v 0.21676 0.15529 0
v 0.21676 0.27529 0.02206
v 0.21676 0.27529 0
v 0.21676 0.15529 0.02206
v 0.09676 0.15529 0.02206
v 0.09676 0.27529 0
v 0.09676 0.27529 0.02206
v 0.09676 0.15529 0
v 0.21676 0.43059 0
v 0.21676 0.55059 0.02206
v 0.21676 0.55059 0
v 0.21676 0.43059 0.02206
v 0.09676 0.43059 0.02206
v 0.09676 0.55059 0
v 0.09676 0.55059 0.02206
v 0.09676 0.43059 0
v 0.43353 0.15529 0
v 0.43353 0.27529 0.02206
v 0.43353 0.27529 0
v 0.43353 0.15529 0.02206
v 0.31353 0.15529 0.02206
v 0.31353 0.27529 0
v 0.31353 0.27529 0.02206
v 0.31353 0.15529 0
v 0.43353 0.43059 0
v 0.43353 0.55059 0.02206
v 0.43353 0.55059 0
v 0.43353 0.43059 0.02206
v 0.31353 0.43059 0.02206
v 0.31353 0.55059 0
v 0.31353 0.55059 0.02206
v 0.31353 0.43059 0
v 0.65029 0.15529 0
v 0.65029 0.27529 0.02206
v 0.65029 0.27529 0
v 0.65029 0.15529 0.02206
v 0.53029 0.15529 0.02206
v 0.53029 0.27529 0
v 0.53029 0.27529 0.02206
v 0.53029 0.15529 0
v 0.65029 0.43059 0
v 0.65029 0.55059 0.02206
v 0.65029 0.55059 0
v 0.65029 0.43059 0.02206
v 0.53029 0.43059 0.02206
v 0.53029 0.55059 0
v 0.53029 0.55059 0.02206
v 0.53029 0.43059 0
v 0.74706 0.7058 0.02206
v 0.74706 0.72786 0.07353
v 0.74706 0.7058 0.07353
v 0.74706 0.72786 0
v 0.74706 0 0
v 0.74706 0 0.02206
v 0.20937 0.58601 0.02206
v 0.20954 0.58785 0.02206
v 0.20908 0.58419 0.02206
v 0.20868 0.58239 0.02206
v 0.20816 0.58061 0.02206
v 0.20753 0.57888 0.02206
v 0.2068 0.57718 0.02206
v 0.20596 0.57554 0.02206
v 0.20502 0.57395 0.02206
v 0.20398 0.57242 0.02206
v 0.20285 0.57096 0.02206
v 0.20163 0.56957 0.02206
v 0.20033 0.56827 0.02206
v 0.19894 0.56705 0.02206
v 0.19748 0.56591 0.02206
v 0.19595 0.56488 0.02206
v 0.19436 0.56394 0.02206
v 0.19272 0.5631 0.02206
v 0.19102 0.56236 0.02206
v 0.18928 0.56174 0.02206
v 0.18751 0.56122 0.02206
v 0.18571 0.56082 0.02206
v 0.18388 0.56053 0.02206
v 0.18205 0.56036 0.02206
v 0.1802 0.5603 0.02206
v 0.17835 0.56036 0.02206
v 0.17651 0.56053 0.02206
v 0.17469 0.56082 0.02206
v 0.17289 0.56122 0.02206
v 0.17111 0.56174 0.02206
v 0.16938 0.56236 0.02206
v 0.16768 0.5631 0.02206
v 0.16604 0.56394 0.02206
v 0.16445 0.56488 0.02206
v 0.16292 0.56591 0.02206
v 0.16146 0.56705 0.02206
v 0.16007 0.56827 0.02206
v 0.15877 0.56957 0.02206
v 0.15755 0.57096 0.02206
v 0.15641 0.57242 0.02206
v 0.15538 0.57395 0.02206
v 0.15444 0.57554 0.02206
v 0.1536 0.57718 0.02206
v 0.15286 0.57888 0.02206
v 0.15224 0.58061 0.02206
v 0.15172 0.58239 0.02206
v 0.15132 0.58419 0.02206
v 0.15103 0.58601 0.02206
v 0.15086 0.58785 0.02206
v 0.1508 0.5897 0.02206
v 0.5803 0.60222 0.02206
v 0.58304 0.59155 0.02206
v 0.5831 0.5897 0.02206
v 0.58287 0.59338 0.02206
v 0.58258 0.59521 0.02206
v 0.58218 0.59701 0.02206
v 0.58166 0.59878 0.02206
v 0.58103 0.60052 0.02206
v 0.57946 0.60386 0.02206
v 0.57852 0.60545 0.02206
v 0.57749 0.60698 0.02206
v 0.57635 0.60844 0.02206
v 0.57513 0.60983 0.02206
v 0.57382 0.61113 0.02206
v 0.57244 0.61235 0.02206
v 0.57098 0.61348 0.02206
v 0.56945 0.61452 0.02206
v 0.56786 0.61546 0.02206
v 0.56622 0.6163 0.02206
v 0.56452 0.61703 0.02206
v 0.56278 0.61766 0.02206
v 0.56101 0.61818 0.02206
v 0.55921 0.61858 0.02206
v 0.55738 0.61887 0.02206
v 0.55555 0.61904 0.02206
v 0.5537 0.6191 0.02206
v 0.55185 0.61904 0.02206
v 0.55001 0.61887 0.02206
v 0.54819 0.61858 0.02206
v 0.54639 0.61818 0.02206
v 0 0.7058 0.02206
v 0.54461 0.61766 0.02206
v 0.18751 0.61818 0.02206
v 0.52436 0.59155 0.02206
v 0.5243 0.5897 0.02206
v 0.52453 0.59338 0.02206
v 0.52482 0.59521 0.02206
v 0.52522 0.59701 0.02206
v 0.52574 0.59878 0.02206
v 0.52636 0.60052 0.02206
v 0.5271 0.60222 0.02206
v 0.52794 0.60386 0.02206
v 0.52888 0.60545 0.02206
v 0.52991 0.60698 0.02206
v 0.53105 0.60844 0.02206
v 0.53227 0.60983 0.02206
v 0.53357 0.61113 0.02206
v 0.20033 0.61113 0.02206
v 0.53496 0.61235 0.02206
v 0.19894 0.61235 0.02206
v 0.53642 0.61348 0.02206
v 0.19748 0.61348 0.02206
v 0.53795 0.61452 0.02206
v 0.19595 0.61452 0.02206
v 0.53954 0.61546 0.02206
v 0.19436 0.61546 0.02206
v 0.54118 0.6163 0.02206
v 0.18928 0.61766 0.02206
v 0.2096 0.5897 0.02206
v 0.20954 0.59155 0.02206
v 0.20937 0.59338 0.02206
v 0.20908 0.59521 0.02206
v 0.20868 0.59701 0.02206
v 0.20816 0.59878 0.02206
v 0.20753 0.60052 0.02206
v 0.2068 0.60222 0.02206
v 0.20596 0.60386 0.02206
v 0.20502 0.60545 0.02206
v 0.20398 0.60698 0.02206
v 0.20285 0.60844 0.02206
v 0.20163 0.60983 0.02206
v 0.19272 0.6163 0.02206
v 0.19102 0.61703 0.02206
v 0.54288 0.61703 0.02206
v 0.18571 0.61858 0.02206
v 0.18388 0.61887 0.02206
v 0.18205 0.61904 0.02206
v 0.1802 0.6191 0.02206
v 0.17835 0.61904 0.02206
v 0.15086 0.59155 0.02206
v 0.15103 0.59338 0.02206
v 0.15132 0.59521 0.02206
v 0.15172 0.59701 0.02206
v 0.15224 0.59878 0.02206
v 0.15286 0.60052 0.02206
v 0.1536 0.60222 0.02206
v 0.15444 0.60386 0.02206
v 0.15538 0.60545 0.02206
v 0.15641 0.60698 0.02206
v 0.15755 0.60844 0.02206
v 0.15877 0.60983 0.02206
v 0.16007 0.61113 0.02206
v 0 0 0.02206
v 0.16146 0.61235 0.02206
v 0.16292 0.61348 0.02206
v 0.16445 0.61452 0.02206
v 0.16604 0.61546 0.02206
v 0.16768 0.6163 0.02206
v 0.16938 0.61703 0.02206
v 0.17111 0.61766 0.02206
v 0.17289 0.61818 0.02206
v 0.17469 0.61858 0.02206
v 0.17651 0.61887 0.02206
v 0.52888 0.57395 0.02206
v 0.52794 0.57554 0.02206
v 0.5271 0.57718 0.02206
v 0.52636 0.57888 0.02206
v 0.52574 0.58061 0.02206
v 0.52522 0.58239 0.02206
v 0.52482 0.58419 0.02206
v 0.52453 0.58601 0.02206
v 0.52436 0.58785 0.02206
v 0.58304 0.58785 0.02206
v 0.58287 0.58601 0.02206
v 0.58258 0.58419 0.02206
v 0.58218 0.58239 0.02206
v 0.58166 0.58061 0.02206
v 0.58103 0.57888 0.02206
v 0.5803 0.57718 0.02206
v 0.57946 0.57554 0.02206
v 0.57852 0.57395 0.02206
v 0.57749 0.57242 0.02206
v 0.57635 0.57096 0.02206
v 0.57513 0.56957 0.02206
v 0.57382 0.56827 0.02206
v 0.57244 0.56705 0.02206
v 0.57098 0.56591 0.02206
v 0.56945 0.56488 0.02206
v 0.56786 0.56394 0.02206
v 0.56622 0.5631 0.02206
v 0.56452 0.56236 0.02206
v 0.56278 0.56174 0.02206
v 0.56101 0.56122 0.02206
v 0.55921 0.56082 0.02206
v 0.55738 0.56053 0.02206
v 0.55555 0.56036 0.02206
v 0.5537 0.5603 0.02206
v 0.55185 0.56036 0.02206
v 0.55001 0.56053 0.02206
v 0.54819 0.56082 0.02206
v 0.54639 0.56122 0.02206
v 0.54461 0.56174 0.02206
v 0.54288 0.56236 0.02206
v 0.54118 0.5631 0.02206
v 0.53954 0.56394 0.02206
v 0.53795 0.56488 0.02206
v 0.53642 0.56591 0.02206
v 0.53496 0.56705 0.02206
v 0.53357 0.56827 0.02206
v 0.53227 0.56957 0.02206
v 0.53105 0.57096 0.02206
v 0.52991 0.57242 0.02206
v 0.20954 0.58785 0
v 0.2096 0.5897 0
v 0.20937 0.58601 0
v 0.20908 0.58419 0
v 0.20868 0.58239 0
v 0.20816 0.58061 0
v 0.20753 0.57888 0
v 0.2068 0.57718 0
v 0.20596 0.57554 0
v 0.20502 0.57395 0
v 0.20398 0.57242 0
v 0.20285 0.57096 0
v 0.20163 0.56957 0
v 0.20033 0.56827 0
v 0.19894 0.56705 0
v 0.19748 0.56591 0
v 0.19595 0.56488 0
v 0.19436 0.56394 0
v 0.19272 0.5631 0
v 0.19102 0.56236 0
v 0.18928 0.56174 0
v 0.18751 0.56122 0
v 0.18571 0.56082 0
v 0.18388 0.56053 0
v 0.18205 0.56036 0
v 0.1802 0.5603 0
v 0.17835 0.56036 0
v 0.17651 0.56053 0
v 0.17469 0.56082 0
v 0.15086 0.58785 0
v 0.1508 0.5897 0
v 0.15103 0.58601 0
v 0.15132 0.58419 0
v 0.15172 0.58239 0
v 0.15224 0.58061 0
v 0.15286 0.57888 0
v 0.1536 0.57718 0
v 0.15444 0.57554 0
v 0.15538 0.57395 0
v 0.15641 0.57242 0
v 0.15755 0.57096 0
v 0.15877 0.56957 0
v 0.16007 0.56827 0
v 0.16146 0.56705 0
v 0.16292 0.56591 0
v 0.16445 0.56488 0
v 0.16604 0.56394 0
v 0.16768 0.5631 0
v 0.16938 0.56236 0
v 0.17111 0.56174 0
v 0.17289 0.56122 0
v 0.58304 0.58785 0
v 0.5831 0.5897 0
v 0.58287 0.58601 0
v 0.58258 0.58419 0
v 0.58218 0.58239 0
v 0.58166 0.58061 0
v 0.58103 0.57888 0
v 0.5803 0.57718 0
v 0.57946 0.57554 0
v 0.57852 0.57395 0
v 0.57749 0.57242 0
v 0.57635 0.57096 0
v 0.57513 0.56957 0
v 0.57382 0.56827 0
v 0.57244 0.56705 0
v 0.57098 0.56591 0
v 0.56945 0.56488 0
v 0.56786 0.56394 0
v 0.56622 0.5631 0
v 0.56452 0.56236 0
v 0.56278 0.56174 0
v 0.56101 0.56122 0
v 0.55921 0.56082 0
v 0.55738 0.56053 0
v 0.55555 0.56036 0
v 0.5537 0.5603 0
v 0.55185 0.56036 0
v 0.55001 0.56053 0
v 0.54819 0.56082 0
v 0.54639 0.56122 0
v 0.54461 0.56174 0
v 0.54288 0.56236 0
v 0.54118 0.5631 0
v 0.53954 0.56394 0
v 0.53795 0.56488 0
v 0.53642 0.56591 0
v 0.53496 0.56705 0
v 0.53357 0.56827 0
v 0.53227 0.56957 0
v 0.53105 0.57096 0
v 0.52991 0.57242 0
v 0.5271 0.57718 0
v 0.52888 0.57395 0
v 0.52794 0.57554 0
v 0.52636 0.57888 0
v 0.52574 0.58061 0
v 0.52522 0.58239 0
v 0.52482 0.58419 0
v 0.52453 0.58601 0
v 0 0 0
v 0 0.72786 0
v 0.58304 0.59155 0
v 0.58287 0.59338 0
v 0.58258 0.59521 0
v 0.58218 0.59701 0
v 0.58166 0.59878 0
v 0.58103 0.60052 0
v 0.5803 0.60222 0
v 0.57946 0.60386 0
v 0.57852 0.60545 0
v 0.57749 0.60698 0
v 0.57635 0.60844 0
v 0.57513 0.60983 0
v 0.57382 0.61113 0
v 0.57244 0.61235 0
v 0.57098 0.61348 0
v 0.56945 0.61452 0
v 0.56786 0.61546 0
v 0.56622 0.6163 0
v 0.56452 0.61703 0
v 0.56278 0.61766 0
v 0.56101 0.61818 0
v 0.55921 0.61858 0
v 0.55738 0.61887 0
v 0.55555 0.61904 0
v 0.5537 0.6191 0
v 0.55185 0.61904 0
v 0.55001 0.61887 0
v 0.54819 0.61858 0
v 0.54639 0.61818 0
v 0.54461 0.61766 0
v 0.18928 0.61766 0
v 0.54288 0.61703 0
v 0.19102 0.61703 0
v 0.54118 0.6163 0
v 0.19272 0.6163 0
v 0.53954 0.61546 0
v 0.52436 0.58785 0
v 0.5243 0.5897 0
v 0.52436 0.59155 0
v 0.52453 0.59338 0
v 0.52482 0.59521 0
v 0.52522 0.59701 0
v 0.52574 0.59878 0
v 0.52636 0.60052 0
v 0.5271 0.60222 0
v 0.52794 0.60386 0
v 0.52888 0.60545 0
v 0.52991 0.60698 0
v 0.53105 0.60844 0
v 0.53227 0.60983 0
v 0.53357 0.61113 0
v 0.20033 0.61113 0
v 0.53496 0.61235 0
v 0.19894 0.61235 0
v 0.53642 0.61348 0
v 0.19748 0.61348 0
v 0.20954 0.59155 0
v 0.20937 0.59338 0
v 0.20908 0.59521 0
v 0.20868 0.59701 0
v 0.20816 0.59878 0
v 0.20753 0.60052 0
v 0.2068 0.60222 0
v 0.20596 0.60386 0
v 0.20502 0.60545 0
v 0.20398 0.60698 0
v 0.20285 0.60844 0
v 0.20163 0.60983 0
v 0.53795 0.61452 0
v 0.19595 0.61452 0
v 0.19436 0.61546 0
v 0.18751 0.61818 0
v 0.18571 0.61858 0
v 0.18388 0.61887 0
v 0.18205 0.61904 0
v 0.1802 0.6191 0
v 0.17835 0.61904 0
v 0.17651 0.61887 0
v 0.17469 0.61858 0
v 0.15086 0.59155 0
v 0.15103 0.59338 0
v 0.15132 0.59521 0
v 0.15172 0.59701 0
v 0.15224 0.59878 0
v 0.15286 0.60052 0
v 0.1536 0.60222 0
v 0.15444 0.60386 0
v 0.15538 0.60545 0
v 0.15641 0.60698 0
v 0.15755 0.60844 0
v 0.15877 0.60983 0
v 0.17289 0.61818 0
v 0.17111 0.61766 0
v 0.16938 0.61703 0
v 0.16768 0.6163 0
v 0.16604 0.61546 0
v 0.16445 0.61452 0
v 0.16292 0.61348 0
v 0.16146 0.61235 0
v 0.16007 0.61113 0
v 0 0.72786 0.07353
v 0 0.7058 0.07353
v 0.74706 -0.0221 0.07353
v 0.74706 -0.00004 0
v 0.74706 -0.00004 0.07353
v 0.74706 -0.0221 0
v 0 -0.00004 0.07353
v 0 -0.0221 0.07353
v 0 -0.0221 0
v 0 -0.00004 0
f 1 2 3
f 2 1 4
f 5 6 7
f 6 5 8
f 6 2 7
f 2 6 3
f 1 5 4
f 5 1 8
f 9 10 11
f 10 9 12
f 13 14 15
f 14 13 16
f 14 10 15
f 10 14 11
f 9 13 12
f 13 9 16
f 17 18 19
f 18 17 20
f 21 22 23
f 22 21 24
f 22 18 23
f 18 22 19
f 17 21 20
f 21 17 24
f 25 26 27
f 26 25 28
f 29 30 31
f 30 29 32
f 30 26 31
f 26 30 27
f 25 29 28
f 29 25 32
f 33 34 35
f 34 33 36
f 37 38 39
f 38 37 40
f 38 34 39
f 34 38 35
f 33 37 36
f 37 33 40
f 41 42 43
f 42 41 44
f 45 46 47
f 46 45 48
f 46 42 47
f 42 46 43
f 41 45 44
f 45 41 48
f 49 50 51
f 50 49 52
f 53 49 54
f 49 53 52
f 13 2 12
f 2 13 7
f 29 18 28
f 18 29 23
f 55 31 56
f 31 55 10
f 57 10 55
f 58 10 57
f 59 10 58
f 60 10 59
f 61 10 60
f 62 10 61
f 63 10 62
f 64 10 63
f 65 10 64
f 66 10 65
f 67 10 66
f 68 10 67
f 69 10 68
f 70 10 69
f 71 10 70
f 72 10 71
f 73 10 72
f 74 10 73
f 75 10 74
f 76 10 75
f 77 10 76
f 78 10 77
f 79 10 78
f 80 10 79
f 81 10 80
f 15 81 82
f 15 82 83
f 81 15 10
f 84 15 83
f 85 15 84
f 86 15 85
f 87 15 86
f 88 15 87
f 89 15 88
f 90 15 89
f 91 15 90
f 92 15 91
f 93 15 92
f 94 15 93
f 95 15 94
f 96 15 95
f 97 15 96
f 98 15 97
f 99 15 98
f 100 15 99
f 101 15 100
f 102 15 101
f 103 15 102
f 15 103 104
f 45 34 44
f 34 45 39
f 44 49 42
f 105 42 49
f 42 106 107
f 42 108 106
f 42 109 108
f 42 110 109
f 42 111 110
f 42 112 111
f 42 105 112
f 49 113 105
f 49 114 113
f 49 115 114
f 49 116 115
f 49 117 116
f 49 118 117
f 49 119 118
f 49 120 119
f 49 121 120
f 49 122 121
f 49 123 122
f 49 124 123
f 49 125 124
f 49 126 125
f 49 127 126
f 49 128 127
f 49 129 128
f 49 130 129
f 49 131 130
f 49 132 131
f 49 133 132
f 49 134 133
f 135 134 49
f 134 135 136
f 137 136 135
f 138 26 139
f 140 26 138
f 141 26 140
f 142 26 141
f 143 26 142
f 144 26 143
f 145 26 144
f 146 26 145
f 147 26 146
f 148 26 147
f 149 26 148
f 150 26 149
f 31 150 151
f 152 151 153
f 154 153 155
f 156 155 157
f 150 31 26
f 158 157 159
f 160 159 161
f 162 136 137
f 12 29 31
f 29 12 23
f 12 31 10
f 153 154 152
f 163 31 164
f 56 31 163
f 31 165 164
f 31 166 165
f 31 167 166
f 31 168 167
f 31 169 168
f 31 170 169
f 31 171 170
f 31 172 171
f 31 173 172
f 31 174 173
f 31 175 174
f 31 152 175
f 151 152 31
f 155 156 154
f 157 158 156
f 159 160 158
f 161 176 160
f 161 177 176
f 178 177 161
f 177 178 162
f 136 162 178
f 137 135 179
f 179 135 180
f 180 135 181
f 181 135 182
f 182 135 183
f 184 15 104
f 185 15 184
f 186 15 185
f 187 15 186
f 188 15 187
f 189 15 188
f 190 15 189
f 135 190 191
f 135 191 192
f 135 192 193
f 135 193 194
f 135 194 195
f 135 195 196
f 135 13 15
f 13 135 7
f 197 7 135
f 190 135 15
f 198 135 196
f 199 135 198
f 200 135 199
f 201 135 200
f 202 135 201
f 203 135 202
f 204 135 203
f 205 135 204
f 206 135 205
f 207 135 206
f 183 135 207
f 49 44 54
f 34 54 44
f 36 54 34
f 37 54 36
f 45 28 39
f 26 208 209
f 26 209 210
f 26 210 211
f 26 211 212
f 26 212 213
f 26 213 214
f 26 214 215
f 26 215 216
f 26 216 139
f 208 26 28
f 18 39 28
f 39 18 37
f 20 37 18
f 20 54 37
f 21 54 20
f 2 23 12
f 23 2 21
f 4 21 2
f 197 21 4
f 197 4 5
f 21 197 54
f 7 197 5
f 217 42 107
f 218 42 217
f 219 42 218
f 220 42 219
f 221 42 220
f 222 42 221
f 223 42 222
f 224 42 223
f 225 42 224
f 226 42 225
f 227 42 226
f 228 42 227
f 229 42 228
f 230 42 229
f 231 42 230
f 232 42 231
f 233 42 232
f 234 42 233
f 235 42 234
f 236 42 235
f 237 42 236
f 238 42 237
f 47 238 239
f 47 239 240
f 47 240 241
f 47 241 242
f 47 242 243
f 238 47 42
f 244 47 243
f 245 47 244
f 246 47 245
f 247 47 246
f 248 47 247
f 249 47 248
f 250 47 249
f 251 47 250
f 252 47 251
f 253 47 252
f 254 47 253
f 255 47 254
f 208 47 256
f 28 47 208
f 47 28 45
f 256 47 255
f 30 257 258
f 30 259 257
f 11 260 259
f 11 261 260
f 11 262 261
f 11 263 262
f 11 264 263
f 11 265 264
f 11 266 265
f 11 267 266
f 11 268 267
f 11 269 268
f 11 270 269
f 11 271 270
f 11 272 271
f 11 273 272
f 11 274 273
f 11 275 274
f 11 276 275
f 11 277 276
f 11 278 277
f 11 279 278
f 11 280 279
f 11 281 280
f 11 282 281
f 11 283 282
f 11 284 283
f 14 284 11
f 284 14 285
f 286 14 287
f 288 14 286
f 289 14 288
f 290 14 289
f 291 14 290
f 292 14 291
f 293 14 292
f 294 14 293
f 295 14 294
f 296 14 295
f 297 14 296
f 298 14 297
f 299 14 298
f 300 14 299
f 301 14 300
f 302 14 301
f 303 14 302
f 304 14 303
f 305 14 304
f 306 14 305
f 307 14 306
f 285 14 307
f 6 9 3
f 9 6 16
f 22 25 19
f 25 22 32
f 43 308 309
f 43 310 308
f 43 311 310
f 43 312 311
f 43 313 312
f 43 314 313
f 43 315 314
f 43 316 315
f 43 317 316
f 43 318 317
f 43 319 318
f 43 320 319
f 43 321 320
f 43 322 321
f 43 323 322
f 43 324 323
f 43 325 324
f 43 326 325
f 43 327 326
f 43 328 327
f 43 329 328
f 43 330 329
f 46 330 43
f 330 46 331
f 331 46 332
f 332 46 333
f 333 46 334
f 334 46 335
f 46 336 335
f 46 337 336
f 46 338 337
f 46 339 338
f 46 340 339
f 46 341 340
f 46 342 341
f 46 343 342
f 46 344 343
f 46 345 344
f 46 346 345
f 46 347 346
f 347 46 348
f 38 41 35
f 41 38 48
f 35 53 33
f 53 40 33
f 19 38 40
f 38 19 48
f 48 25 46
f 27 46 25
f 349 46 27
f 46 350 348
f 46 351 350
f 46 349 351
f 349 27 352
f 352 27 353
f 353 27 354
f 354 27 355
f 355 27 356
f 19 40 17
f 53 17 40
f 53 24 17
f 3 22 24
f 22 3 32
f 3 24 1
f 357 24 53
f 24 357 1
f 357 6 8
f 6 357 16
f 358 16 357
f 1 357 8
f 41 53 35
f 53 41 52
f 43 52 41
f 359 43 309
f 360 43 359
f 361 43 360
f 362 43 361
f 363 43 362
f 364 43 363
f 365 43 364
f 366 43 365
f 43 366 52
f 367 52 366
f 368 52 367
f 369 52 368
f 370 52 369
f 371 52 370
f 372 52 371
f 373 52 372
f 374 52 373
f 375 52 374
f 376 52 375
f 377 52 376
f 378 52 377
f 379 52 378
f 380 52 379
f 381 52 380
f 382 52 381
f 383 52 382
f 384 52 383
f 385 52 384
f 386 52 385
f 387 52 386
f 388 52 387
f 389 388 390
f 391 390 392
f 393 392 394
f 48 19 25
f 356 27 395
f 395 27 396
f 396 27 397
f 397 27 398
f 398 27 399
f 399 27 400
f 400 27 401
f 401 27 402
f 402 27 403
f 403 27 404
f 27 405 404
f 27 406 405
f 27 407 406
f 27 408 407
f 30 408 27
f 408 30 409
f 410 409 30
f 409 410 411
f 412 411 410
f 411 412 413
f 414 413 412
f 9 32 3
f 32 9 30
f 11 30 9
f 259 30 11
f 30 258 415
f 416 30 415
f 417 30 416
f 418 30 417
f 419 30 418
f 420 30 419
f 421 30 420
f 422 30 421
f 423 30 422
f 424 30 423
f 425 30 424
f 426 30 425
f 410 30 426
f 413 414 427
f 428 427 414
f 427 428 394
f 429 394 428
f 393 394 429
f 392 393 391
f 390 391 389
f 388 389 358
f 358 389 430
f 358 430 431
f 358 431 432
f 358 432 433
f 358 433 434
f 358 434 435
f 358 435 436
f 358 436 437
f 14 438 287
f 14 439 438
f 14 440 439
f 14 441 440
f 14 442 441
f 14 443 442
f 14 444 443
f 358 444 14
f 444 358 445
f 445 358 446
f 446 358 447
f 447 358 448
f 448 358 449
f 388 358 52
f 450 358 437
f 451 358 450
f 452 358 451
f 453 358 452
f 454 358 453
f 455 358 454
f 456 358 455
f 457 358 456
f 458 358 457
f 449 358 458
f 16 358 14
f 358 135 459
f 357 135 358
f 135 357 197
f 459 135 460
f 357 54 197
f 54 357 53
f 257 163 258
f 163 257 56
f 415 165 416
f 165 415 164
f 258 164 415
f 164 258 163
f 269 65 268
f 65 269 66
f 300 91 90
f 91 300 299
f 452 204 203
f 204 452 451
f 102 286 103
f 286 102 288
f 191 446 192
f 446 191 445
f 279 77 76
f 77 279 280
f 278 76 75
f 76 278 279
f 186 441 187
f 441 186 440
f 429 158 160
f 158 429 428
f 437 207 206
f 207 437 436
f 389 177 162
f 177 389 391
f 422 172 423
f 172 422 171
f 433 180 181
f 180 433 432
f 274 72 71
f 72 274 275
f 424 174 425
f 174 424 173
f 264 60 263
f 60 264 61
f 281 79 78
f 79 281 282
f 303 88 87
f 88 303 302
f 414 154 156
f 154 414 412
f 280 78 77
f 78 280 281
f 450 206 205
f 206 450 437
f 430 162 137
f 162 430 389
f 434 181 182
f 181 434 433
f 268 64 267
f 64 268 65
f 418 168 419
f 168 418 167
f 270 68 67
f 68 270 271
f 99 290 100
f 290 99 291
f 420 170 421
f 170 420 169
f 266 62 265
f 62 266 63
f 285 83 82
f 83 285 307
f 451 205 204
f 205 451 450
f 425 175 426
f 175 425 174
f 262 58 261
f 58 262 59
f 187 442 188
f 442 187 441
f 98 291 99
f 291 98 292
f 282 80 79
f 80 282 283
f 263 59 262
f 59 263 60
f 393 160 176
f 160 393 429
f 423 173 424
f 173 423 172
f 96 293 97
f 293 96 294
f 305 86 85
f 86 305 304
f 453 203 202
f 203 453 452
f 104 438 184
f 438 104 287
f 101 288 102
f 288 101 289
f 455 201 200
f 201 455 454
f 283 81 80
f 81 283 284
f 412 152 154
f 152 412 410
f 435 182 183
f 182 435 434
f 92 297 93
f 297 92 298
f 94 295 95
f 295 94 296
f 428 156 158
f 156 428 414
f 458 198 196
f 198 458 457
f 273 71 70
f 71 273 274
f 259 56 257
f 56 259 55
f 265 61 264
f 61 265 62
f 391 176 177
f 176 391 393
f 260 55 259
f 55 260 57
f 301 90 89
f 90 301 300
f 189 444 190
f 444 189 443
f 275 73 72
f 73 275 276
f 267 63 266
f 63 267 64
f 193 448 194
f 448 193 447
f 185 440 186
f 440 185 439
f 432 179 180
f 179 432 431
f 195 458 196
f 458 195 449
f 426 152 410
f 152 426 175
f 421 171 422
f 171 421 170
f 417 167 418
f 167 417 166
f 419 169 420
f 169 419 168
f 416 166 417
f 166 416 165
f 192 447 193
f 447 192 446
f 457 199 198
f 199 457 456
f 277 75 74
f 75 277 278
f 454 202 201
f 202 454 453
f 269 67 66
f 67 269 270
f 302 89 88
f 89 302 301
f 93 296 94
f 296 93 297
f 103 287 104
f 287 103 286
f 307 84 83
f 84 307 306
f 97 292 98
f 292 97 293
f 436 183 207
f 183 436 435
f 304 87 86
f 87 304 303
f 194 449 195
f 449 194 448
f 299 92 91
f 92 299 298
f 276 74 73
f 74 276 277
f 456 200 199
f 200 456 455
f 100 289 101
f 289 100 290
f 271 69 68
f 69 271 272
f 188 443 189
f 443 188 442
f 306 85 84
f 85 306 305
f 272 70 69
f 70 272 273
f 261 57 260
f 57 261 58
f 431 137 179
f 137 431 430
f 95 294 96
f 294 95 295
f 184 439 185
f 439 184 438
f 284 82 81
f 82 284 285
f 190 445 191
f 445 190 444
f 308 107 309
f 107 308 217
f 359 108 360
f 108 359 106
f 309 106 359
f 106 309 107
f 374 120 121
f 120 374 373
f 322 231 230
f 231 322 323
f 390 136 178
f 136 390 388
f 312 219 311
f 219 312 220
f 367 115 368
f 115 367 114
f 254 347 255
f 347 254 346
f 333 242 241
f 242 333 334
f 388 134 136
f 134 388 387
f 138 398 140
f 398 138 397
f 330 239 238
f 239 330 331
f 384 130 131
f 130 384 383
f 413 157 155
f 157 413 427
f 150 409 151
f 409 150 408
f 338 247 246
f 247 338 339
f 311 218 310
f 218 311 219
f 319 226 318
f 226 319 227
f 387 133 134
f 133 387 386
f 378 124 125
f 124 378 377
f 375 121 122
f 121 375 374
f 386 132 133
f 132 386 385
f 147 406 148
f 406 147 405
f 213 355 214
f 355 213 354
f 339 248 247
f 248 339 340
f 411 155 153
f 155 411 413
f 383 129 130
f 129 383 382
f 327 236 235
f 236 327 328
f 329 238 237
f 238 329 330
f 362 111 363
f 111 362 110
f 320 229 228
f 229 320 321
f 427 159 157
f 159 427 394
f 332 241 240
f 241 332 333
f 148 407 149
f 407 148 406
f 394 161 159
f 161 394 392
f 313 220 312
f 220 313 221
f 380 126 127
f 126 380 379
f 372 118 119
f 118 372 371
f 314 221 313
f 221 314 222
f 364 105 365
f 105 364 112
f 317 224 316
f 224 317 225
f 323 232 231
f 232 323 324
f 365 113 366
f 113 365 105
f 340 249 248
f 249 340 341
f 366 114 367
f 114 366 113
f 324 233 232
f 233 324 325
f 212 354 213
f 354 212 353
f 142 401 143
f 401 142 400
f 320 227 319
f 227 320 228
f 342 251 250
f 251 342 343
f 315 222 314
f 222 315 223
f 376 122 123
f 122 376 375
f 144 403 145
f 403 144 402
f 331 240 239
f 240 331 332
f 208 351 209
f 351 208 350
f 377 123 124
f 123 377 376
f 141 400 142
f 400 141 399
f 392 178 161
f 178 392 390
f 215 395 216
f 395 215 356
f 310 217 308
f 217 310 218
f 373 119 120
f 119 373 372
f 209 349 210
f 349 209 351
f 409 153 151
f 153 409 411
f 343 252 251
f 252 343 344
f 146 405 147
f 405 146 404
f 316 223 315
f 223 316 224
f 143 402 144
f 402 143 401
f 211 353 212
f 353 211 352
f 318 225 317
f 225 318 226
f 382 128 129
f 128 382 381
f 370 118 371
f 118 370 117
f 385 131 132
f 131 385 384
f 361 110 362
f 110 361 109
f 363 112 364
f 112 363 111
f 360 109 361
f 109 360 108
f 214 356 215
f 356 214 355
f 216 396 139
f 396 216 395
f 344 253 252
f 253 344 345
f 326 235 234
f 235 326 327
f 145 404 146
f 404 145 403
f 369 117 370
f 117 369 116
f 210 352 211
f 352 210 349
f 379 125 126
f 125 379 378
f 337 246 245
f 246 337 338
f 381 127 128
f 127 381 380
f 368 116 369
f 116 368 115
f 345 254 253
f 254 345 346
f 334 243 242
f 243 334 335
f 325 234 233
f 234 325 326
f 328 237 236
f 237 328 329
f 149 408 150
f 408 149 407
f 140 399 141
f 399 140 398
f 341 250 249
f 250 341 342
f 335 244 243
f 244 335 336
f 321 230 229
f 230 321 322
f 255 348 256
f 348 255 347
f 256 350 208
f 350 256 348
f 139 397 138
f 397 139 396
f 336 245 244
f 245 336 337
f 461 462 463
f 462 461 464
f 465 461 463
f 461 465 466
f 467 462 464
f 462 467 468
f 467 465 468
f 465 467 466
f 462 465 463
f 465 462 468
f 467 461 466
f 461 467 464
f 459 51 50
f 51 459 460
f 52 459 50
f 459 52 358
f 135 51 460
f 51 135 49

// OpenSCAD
// ==========================================
// Parameters
// ==========================================
base_length  = 0.747059;
base_width   = 0.705882;
base_height  = 0.022059;

wall_height     = 0.073529;
wall_thickness  = 0.022059;
wall_front_y    = -0.0221;
wall_back_y     =  0.7058;

hole_radius = 0.0294;
hole1_x = 0.1802;
hole1_y = 0.5897;
hole2_x = 0.5537;
hole2_y = 0.5897;

// Void layout configuration
num_voids_x = 3;
num_voids_y = 2;
void_length = 0.12;
void_width  = 0.12;

// Auto-calculate even spacing margins
margin_x = (base_length - num_voids_x * void_length) / (num_voids_x + 1);
margin_y = (base_width  - num_voids_y * void_width)  / (num_voids_y + 1);

// Resolution control
$fn = 100;

// ==========================================
// Base Web Module
// ==========================================
module base_web() {
    difference() {
        // Outer rectangular footprint
        cube([base_length, base_width, base_height]);

        // Six inner rectangular voids (3x2 grid)
        for (i = [0 : num_voids_x - 1]) {
            for (j = [0 : num_voids_y - 1]) {
                vx = margin_x + i * (void_length + margin_x);
                vy = margin_y + j * (void_width  + margin_y);
                translate([vx, vy, -0.005])
                    cube([void_length, void_width, base_height + 0.01]);
            }
        }

        // Two circular through openings
        translate([hole1_x, hole1_y, -0.005])
            cylinder(h = base_height + 0.01, r = hole_radius);
        translate([hole2_x, hole2_y, -0.005])
            cylinder(h = base_height + 0.01, r = hole_radius);
    }
}

// ==========================================
// Front Wall Module
// ==========================================
module front_wall() {
    translate([0, wall_front_y, 0])
        cube([base_length, wall_thickness, wall_height]);
}

// ==========================================
// Back Wall Module
// ==========================================
module back_wall() {
    translate([0, wall_back_y, 0])
        cube([base_length, wall_thickness, wall_height]);
}

// ==========================================
// Main Assembly
// ==========================================
union() {
    base_web();
    front_wall();
    back_wall();
}
